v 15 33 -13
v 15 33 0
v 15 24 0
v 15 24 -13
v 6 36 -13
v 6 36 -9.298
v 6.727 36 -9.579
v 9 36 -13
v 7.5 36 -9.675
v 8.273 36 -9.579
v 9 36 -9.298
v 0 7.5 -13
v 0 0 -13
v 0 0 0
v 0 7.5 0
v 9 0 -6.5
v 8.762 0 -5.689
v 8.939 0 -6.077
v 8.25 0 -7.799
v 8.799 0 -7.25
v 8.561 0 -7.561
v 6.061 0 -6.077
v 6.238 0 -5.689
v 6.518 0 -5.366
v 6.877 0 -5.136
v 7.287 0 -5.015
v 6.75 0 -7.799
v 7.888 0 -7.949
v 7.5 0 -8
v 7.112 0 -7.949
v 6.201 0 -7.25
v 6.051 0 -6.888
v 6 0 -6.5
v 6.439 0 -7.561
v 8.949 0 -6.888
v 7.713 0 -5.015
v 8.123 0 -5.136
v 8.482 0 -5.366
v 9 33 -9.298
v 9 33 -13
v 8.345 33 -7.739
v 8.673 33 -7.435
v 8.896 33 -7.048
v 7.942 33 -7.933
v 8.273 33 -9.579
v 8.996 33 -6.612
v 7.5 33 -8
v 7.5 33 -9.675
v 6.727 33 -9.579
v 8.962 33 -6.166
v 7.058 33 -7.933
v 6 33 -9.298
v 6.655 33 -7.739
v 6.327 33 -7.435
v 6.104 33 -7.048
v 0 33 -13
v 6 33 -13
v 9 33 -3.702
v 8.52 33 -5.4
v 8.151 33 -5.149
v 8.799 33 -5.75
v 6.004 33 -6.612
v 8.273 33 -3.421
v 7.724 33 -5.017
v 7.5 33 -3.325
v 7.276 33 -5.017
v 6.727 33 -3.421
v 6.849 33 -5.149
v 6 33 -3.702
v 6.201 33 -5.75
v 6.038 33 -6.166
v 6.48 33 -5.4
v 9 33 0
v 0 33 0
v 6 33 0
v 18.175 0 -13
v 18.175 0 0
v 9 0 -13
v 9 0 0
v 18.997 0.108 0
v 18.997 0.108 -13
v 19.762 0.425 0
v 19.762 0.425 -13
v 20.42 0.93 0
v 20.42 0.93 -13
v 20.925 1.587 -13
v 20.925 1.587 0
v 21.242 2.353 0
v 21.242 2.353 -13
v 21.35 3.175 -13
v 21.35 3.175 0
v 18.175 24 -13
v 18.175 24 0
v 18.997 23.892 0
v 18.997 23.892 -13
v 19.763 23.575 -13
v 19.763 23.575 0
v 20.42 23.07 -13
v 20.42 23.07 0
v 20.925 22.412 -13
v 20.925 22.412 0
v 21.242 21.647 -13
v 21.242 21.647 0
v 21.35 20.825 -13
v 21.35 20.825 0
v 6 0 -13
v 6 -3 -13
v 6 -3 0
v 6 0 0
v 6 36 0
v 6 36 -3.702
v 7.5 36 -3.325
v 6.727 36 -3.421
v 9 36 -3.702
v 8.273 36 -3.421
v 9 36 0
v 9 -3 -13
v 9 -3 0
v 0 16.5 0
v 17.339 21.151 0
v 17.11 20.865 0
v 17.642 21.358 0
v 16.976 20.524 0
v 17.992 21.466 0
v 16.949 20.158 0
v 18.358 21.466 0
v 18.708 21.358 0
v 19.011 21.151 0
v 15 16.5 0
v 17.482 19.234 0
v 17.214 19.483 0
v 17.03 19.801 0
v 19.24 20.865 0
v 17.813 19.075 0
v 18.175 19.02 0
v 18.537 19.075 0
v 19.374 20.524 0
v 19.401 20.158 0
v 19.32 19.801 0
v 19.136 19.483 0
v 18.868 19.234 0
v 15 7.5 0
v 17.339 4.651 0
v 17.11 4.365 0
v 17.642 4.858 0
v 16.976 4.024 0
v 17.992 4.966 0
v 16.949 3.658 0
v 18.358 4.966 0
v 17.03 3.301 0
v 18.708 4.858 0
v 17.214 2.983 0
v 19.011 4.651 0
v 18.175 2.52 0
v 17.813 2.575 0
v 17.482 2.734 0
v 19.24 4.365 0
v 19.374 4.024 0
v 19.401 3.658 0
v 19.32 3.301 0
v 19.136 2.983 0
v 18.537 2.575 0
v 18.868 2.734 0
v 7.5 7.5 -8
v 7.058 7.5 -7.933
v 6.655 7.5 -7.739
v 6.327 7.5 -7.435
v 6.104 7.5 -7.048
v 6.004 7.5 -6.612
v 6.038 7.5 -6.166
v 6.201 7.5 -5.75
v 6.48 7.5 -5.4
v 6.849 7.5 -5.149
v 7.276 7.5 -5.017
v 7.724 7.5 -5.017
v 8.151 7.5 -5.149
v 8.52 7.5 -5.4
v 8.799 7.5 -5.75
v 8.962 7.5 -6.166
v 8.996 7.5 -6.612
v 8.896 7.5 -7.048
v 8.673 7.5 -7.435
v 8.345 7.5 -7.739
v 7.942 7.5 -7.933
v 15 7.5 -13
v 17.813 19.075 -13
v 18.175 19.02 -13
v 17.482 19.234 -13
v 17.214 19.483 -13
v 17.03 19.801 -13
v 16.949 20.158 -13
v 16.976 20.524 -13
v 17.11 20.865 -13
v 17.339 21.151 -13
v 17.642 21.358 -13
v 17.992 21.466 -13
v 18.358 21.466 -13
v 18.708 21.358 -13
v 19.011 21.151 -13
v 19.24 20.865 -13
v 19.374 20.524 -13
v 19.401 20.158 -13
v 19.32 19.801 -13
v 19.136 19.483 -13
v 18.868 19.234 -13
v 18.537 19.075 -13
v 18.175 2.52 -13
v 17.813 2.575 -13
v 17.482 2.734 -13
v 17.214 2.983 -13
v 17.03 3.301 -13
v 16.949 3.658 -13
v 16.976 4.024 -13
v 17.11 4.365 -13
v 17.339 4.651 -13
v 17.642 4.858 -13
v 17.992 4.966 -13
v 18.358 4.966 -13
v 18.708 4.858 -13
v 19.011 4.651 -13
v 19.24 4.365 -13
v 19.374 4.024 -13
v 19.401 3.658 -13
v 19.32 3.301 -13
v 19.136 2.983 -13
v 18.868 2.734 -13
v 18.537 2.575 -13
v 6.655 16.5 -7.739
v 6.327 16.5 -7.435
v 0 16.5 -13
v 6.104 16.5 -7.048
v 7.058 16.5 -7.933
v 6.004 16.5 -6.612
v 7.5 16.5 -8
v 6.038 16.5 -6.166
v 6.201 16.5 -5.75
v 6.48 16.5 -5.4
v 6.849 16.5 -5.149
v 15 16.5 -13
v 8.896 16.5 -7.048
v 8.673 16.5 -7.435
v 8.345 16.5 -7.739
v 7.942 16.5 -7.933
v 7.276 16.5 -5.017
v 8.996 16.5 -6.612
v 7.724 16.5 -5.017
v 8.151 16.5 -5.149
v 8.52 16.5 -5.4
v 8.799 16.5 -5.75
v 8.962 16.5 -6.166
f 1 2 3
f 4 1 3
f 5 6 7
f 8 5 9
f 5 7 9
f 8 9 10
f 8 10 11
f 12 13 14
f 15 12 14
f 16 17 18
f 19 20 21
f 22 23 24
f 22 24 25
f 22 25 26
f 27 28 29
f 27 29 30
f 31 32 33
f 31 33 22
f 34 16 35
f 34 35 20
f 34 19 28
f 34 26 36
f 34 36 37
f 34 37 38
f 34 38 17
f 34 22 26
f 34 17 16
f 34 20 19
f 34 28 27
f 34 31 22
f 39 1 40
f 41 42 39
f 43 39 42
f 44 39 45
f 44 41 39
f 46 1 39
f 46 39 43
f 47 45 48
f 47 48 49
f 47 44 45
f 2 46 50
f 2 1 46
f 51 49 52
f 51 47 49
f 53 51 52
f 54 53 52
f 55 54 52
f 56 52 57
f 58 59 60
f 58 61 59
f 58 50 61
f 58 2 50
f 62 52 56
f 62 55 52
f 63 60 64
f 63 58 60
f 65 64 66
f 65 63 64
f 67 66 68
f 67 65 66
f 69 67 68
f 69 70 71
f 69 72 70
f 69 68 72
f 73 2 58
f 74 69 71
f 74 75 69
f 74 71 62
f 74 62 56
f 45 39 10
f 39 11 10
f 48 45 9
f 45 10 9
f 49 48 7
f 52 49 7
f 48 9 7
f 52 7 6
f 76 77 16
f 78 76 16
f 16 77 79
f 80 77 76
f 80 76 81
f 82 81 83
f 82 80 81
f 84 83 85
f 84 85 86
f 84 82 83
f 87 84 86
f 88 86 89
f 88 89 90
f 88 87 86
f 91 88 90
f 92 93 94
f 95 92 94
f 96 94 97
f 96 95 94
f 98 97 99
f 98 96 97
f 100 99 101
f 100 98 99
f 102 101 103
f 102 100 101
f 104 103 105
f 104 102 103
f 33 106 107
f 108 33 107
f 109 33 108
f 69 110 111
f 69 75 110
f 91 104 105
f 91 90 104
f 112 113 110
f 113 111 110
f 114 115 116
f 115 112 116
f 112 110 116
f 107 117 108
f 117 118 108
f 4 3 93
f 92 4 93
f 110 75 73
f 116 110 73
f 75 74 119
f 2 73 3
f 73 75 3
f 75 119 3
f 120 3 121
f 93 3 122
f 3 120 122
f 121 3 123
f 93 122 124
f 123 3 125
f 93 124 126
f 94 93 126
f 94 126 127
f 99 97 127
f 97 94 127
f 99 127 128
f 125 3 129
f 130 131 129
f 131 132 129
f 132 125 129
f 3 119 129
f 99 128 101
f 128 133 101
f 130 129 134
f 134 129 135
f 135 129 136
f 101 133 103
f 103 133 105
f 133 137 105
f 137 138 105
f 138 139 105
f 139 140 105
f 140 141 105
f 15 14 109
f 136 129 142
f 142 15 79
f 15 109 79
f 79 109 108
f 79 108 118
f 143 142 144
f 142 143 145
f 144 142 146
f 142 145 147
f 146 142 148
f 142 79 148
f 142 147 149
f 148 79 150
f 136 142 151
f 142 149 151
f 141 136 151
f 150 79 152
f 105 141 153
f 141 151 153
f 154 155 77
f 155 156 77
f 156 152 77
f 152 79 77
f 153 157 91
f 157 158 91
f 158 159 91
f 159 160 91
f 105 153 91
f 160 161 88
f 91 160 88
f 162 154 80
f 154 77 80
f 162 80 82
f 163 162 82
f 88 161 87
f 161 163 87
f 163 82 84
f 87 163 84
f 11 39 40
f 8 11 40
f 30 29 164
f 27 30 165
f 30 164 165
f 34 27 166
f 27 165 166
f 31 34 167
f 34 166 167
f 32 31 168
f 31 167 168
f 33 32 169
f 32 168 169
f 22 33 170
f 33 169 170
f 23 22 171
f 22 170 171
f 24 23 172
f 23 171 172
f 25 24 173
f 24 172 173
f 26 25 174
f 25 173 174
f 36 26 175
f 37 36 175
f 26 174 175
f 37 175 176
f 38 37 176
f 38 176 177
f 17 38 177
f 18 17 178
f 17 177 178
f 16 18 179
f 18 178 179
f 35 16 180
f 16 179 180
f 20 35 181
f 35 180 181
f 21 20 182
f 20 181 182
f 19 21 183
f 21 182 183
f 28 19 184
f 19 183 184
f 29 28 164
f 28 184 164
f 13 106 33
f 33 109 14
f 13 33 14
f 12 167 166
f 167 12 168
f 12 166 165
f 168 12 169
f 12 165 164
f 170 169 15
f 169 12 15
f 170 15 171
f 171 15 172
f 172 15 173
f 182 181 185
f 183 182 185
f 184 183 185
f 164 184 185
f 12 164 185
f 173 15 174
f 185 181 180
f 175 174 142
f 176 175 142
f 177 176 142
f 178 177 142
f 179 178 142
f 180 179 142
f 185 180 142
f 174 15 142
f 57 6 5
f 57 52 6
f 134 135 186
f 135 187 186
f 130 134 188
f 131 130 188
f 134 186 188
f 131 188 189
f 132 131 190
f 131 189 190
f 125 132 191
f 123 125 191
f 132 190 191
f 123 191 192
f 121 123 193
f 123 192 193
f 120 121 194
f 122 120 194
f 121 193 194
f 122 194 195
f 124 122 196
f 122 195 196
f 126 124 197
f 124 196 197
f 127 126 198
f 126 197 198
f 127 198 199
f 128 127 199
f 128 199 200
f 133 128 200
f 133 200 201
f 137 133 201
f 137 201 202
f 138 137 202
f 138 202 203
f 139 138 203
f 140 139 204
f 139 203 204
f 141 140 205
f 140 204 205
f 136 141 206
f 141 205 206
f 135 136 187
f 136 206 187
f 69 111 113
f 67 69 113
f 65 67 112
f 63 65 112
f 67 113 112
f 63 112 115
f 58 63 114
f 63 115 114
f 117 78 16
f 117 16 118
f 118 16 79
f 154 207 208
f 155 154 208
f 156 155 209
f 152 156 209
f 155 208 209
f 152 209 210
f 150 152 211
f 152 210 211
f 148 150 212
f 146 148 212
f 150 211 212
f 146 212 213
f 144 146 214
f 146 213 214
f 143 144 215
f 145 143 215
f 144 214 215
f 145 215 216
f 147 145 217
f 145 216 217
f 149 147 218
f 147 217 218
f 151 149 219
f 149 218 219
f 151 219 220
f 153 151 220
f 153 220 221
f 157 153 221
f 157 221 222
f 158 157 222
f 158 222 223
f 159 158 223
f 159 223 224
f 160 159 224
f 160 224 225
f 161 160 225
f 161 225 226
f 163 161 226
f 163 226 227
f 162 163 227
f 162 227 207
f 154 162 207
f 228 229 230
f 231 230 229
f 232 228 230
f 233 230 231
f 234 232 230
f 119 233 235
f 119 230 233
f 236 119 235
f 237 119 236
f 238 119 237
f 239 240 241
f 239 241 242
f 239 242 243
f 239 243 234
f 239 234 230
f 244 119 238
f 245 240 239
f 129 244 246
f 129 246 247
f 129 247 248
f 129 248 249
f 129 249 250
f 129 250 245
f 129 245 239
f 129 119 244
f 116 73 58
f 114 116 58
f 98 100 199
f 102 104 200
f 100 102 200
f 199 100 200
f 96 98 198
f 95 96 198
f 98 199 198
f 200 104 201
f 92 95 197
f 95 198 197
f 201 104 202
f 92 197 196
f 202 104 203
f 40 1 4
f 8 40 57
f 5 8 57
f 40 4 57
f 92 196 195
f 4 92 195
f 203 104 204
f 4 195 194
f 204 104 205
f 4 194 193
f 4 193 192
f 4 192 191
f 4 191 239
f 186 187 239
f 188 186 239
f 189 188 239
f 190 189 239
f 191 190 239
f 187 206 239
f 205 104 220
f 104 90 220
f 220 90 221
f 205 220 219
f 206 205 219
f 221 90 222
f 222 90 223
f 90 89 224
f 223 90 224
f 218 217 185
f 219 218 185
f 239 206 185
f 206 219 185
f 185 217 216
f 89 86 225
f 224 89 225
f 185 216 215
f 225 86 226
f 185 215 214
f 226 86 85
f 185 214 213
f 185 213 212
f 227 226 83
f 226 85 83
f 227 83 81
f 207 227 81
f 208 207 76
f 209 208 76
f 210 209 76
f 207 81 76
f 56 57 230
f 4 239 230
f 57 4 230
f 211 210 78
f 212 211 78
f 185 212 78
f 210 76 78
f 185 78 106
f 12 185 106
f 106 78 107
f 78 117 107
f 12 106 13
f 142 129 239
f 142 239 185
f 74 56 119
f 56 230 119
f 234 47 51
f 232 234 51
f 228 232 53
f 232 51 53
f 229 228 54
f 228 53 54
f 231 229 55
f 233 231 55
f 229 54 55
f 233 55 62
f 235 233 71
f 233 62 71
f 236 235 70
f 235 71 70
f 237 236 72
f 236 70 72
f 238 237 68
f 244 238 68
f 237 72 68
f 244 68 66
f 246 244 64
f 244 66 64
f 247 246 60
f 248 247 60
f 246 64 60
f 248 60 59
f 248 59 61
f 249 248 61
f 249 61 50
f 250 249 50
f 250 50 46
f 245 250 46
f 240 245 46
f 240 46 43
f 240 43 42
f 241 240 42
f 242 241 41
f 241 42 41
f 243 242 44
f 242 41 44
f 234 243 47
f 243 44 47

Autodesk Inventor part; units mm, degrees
ref_plane "YZ Plane" through (0, 0, 0) normal (1, 0, 0) x (0, 1, 0)
ref_plane "XZ Plane" through (0, 0, 0) normal (0, 1, 0) x (-1, 0, 0)
sketch "Base Profile" plane through (0, 0, 0) normal (0, 1, 0) x (-1, 0, 0)
  line L0 (0, 0) -> (-15, 0)
  line L1 (-15, 0) -> (-15, -13)
  line L2 (-15, -13) -> (0, -13)
  line L3 (0, -13) -> (0, 0)
  line L4 (-15, -13) -> (-21.35, -13)
  line L5 (-21.35, -13) -> (-21.35, 0)
  line L6 (-21.35, 0) -> (-15, 0)
  line L7 (-7.5, -13) -> (-7.5, 0) construction
  circle A0 centre (-7.5, -6.5) radius 1.5
  line L8 (-6, -13) -> (-6, 0)
  line L9 (-9, -13) -> (-9, 0)
  circle A1 centre (-7.5, -6.5) radius 3.175
  point P0 (-9, 0)
  dimension "d376" = 15
  dimension "d380" = 13
  dimension "d381" = 6.35
  dimension "d395" = 3
  dimension "d405" = 6.35
extrude "Stock" add sketch "Base Profile" along normal blind 33
ref_plane "Work Plane3" through (0, 16.5, 0) normal (0, -1, 0) x (1, 0, 0)
extrude "Guide" add sketch "Base Profile" against normal blind 3 contours L8 A1 L9 L0 | L8 A0 L9 A1 | L2 L9 A1 L8 | A0 | L8 A1 L9 A0
mirror "Mirror3" about plane through (0, 16.5, 0) normal (0, -1, 0) of "Guide"
sketch "Front Profile" plane through (0, 0, 0) normal (0, 0, 1) x (1, 0, 0)
  line L0 (21.35, 0) -> (21.35, 33) projected
  line L1 (0, 33) -> (6, 33) projected
  line L2 (0, 0) -> (0, 33) projected
  line L3 (0, 16.5) -> (21.35, 16.5)
  line L4 (0, 7.5) -> (21.35, 7.5)
  line L5 (15, 33) -> (15, 0)
  line L6 (9, 0) -> (21.35, 0) projected
  line L7 (0, 0) -> (6, 0) projected
  line L8 (6, 0) -> (6, -3) projected
  line L9 (9, -3) -> (6, -3) projected
  line L10 (9, 0) -> (9, -3) projected
  line L11 (9, 33) -> (21.35, 33) projected
  line L12 (9, 33) -> (9, 36) projected
  line L13 (9, 36) -> (6, 36) projected
  line L14 (6, 33) -> (6, 36) projected
  line L15 (15, 24) -> (21.35, 24)
  line L16 (15, 16.5) -> (21.35, 24) construction
  line L17 (21.35, 7.5) -> (15, 0) construction
  circle A0 centre (18.175, 20.25) radius 1.5
  circle A1 centre (18.175, 3.75) radius 1.5
  point P0 (15, 7.5)
  dimension "d383" = 9
  dimension "d384" = 6.35
  dimension "d408" = 7.5
  dimension "d409" = 7.5
  dimension "d413" = 3
  dimension "d414" = 3
extrude "Bearing Clearance" cut sketch "Front Profile" against normal through all contours L4 L2 L3 L5
extrude "Hole Clearance" cut sketch "Base Profile" against normal blind 3 from surface at 36 contours A1 L8 | L8 A0 L9 A1 | L9 A1 | A0 | L8 A1 L9 A0
hole "Hole25" at (7.5, 0, -6.5) direction (0, 1, 0) diameter 3 end through all
extrude "Extrusion22" cut sketch "Front Profile" against normal through all contours L15 L5 L11 L0
fillet "Fillet3" radius 3.175 2 edges at (21.35, 24, -6.5) (21.35, 0, -6.5)
hole "Hole26" at (18.175, 20.25, 0) at (18.175, 3.75, 0) direction (0, 0, -1) diameter 2.459 end through all thread size "M3x0.5" class "6H" standard "ANSI Metric M Profile"
equation "\"extrusionWidth\" = 15"
equation "\"idlerLength\" = 0"
equation "\"bearingOffsetFromBottom\" = 7.5"
equation "\"extrusionOffset\" = 33"
equation "\"d165\" = extrusionWidth"
equation "\"bearingStackHeight\" = 9"
equation "\"bearingSlotLength\" = 0"
equation "\"bearingClearance\" = 13"
equation "\"pinSupportLength\" = 2"
properties part number "B Idler (Tulip)" material "Aluminum 6061"
